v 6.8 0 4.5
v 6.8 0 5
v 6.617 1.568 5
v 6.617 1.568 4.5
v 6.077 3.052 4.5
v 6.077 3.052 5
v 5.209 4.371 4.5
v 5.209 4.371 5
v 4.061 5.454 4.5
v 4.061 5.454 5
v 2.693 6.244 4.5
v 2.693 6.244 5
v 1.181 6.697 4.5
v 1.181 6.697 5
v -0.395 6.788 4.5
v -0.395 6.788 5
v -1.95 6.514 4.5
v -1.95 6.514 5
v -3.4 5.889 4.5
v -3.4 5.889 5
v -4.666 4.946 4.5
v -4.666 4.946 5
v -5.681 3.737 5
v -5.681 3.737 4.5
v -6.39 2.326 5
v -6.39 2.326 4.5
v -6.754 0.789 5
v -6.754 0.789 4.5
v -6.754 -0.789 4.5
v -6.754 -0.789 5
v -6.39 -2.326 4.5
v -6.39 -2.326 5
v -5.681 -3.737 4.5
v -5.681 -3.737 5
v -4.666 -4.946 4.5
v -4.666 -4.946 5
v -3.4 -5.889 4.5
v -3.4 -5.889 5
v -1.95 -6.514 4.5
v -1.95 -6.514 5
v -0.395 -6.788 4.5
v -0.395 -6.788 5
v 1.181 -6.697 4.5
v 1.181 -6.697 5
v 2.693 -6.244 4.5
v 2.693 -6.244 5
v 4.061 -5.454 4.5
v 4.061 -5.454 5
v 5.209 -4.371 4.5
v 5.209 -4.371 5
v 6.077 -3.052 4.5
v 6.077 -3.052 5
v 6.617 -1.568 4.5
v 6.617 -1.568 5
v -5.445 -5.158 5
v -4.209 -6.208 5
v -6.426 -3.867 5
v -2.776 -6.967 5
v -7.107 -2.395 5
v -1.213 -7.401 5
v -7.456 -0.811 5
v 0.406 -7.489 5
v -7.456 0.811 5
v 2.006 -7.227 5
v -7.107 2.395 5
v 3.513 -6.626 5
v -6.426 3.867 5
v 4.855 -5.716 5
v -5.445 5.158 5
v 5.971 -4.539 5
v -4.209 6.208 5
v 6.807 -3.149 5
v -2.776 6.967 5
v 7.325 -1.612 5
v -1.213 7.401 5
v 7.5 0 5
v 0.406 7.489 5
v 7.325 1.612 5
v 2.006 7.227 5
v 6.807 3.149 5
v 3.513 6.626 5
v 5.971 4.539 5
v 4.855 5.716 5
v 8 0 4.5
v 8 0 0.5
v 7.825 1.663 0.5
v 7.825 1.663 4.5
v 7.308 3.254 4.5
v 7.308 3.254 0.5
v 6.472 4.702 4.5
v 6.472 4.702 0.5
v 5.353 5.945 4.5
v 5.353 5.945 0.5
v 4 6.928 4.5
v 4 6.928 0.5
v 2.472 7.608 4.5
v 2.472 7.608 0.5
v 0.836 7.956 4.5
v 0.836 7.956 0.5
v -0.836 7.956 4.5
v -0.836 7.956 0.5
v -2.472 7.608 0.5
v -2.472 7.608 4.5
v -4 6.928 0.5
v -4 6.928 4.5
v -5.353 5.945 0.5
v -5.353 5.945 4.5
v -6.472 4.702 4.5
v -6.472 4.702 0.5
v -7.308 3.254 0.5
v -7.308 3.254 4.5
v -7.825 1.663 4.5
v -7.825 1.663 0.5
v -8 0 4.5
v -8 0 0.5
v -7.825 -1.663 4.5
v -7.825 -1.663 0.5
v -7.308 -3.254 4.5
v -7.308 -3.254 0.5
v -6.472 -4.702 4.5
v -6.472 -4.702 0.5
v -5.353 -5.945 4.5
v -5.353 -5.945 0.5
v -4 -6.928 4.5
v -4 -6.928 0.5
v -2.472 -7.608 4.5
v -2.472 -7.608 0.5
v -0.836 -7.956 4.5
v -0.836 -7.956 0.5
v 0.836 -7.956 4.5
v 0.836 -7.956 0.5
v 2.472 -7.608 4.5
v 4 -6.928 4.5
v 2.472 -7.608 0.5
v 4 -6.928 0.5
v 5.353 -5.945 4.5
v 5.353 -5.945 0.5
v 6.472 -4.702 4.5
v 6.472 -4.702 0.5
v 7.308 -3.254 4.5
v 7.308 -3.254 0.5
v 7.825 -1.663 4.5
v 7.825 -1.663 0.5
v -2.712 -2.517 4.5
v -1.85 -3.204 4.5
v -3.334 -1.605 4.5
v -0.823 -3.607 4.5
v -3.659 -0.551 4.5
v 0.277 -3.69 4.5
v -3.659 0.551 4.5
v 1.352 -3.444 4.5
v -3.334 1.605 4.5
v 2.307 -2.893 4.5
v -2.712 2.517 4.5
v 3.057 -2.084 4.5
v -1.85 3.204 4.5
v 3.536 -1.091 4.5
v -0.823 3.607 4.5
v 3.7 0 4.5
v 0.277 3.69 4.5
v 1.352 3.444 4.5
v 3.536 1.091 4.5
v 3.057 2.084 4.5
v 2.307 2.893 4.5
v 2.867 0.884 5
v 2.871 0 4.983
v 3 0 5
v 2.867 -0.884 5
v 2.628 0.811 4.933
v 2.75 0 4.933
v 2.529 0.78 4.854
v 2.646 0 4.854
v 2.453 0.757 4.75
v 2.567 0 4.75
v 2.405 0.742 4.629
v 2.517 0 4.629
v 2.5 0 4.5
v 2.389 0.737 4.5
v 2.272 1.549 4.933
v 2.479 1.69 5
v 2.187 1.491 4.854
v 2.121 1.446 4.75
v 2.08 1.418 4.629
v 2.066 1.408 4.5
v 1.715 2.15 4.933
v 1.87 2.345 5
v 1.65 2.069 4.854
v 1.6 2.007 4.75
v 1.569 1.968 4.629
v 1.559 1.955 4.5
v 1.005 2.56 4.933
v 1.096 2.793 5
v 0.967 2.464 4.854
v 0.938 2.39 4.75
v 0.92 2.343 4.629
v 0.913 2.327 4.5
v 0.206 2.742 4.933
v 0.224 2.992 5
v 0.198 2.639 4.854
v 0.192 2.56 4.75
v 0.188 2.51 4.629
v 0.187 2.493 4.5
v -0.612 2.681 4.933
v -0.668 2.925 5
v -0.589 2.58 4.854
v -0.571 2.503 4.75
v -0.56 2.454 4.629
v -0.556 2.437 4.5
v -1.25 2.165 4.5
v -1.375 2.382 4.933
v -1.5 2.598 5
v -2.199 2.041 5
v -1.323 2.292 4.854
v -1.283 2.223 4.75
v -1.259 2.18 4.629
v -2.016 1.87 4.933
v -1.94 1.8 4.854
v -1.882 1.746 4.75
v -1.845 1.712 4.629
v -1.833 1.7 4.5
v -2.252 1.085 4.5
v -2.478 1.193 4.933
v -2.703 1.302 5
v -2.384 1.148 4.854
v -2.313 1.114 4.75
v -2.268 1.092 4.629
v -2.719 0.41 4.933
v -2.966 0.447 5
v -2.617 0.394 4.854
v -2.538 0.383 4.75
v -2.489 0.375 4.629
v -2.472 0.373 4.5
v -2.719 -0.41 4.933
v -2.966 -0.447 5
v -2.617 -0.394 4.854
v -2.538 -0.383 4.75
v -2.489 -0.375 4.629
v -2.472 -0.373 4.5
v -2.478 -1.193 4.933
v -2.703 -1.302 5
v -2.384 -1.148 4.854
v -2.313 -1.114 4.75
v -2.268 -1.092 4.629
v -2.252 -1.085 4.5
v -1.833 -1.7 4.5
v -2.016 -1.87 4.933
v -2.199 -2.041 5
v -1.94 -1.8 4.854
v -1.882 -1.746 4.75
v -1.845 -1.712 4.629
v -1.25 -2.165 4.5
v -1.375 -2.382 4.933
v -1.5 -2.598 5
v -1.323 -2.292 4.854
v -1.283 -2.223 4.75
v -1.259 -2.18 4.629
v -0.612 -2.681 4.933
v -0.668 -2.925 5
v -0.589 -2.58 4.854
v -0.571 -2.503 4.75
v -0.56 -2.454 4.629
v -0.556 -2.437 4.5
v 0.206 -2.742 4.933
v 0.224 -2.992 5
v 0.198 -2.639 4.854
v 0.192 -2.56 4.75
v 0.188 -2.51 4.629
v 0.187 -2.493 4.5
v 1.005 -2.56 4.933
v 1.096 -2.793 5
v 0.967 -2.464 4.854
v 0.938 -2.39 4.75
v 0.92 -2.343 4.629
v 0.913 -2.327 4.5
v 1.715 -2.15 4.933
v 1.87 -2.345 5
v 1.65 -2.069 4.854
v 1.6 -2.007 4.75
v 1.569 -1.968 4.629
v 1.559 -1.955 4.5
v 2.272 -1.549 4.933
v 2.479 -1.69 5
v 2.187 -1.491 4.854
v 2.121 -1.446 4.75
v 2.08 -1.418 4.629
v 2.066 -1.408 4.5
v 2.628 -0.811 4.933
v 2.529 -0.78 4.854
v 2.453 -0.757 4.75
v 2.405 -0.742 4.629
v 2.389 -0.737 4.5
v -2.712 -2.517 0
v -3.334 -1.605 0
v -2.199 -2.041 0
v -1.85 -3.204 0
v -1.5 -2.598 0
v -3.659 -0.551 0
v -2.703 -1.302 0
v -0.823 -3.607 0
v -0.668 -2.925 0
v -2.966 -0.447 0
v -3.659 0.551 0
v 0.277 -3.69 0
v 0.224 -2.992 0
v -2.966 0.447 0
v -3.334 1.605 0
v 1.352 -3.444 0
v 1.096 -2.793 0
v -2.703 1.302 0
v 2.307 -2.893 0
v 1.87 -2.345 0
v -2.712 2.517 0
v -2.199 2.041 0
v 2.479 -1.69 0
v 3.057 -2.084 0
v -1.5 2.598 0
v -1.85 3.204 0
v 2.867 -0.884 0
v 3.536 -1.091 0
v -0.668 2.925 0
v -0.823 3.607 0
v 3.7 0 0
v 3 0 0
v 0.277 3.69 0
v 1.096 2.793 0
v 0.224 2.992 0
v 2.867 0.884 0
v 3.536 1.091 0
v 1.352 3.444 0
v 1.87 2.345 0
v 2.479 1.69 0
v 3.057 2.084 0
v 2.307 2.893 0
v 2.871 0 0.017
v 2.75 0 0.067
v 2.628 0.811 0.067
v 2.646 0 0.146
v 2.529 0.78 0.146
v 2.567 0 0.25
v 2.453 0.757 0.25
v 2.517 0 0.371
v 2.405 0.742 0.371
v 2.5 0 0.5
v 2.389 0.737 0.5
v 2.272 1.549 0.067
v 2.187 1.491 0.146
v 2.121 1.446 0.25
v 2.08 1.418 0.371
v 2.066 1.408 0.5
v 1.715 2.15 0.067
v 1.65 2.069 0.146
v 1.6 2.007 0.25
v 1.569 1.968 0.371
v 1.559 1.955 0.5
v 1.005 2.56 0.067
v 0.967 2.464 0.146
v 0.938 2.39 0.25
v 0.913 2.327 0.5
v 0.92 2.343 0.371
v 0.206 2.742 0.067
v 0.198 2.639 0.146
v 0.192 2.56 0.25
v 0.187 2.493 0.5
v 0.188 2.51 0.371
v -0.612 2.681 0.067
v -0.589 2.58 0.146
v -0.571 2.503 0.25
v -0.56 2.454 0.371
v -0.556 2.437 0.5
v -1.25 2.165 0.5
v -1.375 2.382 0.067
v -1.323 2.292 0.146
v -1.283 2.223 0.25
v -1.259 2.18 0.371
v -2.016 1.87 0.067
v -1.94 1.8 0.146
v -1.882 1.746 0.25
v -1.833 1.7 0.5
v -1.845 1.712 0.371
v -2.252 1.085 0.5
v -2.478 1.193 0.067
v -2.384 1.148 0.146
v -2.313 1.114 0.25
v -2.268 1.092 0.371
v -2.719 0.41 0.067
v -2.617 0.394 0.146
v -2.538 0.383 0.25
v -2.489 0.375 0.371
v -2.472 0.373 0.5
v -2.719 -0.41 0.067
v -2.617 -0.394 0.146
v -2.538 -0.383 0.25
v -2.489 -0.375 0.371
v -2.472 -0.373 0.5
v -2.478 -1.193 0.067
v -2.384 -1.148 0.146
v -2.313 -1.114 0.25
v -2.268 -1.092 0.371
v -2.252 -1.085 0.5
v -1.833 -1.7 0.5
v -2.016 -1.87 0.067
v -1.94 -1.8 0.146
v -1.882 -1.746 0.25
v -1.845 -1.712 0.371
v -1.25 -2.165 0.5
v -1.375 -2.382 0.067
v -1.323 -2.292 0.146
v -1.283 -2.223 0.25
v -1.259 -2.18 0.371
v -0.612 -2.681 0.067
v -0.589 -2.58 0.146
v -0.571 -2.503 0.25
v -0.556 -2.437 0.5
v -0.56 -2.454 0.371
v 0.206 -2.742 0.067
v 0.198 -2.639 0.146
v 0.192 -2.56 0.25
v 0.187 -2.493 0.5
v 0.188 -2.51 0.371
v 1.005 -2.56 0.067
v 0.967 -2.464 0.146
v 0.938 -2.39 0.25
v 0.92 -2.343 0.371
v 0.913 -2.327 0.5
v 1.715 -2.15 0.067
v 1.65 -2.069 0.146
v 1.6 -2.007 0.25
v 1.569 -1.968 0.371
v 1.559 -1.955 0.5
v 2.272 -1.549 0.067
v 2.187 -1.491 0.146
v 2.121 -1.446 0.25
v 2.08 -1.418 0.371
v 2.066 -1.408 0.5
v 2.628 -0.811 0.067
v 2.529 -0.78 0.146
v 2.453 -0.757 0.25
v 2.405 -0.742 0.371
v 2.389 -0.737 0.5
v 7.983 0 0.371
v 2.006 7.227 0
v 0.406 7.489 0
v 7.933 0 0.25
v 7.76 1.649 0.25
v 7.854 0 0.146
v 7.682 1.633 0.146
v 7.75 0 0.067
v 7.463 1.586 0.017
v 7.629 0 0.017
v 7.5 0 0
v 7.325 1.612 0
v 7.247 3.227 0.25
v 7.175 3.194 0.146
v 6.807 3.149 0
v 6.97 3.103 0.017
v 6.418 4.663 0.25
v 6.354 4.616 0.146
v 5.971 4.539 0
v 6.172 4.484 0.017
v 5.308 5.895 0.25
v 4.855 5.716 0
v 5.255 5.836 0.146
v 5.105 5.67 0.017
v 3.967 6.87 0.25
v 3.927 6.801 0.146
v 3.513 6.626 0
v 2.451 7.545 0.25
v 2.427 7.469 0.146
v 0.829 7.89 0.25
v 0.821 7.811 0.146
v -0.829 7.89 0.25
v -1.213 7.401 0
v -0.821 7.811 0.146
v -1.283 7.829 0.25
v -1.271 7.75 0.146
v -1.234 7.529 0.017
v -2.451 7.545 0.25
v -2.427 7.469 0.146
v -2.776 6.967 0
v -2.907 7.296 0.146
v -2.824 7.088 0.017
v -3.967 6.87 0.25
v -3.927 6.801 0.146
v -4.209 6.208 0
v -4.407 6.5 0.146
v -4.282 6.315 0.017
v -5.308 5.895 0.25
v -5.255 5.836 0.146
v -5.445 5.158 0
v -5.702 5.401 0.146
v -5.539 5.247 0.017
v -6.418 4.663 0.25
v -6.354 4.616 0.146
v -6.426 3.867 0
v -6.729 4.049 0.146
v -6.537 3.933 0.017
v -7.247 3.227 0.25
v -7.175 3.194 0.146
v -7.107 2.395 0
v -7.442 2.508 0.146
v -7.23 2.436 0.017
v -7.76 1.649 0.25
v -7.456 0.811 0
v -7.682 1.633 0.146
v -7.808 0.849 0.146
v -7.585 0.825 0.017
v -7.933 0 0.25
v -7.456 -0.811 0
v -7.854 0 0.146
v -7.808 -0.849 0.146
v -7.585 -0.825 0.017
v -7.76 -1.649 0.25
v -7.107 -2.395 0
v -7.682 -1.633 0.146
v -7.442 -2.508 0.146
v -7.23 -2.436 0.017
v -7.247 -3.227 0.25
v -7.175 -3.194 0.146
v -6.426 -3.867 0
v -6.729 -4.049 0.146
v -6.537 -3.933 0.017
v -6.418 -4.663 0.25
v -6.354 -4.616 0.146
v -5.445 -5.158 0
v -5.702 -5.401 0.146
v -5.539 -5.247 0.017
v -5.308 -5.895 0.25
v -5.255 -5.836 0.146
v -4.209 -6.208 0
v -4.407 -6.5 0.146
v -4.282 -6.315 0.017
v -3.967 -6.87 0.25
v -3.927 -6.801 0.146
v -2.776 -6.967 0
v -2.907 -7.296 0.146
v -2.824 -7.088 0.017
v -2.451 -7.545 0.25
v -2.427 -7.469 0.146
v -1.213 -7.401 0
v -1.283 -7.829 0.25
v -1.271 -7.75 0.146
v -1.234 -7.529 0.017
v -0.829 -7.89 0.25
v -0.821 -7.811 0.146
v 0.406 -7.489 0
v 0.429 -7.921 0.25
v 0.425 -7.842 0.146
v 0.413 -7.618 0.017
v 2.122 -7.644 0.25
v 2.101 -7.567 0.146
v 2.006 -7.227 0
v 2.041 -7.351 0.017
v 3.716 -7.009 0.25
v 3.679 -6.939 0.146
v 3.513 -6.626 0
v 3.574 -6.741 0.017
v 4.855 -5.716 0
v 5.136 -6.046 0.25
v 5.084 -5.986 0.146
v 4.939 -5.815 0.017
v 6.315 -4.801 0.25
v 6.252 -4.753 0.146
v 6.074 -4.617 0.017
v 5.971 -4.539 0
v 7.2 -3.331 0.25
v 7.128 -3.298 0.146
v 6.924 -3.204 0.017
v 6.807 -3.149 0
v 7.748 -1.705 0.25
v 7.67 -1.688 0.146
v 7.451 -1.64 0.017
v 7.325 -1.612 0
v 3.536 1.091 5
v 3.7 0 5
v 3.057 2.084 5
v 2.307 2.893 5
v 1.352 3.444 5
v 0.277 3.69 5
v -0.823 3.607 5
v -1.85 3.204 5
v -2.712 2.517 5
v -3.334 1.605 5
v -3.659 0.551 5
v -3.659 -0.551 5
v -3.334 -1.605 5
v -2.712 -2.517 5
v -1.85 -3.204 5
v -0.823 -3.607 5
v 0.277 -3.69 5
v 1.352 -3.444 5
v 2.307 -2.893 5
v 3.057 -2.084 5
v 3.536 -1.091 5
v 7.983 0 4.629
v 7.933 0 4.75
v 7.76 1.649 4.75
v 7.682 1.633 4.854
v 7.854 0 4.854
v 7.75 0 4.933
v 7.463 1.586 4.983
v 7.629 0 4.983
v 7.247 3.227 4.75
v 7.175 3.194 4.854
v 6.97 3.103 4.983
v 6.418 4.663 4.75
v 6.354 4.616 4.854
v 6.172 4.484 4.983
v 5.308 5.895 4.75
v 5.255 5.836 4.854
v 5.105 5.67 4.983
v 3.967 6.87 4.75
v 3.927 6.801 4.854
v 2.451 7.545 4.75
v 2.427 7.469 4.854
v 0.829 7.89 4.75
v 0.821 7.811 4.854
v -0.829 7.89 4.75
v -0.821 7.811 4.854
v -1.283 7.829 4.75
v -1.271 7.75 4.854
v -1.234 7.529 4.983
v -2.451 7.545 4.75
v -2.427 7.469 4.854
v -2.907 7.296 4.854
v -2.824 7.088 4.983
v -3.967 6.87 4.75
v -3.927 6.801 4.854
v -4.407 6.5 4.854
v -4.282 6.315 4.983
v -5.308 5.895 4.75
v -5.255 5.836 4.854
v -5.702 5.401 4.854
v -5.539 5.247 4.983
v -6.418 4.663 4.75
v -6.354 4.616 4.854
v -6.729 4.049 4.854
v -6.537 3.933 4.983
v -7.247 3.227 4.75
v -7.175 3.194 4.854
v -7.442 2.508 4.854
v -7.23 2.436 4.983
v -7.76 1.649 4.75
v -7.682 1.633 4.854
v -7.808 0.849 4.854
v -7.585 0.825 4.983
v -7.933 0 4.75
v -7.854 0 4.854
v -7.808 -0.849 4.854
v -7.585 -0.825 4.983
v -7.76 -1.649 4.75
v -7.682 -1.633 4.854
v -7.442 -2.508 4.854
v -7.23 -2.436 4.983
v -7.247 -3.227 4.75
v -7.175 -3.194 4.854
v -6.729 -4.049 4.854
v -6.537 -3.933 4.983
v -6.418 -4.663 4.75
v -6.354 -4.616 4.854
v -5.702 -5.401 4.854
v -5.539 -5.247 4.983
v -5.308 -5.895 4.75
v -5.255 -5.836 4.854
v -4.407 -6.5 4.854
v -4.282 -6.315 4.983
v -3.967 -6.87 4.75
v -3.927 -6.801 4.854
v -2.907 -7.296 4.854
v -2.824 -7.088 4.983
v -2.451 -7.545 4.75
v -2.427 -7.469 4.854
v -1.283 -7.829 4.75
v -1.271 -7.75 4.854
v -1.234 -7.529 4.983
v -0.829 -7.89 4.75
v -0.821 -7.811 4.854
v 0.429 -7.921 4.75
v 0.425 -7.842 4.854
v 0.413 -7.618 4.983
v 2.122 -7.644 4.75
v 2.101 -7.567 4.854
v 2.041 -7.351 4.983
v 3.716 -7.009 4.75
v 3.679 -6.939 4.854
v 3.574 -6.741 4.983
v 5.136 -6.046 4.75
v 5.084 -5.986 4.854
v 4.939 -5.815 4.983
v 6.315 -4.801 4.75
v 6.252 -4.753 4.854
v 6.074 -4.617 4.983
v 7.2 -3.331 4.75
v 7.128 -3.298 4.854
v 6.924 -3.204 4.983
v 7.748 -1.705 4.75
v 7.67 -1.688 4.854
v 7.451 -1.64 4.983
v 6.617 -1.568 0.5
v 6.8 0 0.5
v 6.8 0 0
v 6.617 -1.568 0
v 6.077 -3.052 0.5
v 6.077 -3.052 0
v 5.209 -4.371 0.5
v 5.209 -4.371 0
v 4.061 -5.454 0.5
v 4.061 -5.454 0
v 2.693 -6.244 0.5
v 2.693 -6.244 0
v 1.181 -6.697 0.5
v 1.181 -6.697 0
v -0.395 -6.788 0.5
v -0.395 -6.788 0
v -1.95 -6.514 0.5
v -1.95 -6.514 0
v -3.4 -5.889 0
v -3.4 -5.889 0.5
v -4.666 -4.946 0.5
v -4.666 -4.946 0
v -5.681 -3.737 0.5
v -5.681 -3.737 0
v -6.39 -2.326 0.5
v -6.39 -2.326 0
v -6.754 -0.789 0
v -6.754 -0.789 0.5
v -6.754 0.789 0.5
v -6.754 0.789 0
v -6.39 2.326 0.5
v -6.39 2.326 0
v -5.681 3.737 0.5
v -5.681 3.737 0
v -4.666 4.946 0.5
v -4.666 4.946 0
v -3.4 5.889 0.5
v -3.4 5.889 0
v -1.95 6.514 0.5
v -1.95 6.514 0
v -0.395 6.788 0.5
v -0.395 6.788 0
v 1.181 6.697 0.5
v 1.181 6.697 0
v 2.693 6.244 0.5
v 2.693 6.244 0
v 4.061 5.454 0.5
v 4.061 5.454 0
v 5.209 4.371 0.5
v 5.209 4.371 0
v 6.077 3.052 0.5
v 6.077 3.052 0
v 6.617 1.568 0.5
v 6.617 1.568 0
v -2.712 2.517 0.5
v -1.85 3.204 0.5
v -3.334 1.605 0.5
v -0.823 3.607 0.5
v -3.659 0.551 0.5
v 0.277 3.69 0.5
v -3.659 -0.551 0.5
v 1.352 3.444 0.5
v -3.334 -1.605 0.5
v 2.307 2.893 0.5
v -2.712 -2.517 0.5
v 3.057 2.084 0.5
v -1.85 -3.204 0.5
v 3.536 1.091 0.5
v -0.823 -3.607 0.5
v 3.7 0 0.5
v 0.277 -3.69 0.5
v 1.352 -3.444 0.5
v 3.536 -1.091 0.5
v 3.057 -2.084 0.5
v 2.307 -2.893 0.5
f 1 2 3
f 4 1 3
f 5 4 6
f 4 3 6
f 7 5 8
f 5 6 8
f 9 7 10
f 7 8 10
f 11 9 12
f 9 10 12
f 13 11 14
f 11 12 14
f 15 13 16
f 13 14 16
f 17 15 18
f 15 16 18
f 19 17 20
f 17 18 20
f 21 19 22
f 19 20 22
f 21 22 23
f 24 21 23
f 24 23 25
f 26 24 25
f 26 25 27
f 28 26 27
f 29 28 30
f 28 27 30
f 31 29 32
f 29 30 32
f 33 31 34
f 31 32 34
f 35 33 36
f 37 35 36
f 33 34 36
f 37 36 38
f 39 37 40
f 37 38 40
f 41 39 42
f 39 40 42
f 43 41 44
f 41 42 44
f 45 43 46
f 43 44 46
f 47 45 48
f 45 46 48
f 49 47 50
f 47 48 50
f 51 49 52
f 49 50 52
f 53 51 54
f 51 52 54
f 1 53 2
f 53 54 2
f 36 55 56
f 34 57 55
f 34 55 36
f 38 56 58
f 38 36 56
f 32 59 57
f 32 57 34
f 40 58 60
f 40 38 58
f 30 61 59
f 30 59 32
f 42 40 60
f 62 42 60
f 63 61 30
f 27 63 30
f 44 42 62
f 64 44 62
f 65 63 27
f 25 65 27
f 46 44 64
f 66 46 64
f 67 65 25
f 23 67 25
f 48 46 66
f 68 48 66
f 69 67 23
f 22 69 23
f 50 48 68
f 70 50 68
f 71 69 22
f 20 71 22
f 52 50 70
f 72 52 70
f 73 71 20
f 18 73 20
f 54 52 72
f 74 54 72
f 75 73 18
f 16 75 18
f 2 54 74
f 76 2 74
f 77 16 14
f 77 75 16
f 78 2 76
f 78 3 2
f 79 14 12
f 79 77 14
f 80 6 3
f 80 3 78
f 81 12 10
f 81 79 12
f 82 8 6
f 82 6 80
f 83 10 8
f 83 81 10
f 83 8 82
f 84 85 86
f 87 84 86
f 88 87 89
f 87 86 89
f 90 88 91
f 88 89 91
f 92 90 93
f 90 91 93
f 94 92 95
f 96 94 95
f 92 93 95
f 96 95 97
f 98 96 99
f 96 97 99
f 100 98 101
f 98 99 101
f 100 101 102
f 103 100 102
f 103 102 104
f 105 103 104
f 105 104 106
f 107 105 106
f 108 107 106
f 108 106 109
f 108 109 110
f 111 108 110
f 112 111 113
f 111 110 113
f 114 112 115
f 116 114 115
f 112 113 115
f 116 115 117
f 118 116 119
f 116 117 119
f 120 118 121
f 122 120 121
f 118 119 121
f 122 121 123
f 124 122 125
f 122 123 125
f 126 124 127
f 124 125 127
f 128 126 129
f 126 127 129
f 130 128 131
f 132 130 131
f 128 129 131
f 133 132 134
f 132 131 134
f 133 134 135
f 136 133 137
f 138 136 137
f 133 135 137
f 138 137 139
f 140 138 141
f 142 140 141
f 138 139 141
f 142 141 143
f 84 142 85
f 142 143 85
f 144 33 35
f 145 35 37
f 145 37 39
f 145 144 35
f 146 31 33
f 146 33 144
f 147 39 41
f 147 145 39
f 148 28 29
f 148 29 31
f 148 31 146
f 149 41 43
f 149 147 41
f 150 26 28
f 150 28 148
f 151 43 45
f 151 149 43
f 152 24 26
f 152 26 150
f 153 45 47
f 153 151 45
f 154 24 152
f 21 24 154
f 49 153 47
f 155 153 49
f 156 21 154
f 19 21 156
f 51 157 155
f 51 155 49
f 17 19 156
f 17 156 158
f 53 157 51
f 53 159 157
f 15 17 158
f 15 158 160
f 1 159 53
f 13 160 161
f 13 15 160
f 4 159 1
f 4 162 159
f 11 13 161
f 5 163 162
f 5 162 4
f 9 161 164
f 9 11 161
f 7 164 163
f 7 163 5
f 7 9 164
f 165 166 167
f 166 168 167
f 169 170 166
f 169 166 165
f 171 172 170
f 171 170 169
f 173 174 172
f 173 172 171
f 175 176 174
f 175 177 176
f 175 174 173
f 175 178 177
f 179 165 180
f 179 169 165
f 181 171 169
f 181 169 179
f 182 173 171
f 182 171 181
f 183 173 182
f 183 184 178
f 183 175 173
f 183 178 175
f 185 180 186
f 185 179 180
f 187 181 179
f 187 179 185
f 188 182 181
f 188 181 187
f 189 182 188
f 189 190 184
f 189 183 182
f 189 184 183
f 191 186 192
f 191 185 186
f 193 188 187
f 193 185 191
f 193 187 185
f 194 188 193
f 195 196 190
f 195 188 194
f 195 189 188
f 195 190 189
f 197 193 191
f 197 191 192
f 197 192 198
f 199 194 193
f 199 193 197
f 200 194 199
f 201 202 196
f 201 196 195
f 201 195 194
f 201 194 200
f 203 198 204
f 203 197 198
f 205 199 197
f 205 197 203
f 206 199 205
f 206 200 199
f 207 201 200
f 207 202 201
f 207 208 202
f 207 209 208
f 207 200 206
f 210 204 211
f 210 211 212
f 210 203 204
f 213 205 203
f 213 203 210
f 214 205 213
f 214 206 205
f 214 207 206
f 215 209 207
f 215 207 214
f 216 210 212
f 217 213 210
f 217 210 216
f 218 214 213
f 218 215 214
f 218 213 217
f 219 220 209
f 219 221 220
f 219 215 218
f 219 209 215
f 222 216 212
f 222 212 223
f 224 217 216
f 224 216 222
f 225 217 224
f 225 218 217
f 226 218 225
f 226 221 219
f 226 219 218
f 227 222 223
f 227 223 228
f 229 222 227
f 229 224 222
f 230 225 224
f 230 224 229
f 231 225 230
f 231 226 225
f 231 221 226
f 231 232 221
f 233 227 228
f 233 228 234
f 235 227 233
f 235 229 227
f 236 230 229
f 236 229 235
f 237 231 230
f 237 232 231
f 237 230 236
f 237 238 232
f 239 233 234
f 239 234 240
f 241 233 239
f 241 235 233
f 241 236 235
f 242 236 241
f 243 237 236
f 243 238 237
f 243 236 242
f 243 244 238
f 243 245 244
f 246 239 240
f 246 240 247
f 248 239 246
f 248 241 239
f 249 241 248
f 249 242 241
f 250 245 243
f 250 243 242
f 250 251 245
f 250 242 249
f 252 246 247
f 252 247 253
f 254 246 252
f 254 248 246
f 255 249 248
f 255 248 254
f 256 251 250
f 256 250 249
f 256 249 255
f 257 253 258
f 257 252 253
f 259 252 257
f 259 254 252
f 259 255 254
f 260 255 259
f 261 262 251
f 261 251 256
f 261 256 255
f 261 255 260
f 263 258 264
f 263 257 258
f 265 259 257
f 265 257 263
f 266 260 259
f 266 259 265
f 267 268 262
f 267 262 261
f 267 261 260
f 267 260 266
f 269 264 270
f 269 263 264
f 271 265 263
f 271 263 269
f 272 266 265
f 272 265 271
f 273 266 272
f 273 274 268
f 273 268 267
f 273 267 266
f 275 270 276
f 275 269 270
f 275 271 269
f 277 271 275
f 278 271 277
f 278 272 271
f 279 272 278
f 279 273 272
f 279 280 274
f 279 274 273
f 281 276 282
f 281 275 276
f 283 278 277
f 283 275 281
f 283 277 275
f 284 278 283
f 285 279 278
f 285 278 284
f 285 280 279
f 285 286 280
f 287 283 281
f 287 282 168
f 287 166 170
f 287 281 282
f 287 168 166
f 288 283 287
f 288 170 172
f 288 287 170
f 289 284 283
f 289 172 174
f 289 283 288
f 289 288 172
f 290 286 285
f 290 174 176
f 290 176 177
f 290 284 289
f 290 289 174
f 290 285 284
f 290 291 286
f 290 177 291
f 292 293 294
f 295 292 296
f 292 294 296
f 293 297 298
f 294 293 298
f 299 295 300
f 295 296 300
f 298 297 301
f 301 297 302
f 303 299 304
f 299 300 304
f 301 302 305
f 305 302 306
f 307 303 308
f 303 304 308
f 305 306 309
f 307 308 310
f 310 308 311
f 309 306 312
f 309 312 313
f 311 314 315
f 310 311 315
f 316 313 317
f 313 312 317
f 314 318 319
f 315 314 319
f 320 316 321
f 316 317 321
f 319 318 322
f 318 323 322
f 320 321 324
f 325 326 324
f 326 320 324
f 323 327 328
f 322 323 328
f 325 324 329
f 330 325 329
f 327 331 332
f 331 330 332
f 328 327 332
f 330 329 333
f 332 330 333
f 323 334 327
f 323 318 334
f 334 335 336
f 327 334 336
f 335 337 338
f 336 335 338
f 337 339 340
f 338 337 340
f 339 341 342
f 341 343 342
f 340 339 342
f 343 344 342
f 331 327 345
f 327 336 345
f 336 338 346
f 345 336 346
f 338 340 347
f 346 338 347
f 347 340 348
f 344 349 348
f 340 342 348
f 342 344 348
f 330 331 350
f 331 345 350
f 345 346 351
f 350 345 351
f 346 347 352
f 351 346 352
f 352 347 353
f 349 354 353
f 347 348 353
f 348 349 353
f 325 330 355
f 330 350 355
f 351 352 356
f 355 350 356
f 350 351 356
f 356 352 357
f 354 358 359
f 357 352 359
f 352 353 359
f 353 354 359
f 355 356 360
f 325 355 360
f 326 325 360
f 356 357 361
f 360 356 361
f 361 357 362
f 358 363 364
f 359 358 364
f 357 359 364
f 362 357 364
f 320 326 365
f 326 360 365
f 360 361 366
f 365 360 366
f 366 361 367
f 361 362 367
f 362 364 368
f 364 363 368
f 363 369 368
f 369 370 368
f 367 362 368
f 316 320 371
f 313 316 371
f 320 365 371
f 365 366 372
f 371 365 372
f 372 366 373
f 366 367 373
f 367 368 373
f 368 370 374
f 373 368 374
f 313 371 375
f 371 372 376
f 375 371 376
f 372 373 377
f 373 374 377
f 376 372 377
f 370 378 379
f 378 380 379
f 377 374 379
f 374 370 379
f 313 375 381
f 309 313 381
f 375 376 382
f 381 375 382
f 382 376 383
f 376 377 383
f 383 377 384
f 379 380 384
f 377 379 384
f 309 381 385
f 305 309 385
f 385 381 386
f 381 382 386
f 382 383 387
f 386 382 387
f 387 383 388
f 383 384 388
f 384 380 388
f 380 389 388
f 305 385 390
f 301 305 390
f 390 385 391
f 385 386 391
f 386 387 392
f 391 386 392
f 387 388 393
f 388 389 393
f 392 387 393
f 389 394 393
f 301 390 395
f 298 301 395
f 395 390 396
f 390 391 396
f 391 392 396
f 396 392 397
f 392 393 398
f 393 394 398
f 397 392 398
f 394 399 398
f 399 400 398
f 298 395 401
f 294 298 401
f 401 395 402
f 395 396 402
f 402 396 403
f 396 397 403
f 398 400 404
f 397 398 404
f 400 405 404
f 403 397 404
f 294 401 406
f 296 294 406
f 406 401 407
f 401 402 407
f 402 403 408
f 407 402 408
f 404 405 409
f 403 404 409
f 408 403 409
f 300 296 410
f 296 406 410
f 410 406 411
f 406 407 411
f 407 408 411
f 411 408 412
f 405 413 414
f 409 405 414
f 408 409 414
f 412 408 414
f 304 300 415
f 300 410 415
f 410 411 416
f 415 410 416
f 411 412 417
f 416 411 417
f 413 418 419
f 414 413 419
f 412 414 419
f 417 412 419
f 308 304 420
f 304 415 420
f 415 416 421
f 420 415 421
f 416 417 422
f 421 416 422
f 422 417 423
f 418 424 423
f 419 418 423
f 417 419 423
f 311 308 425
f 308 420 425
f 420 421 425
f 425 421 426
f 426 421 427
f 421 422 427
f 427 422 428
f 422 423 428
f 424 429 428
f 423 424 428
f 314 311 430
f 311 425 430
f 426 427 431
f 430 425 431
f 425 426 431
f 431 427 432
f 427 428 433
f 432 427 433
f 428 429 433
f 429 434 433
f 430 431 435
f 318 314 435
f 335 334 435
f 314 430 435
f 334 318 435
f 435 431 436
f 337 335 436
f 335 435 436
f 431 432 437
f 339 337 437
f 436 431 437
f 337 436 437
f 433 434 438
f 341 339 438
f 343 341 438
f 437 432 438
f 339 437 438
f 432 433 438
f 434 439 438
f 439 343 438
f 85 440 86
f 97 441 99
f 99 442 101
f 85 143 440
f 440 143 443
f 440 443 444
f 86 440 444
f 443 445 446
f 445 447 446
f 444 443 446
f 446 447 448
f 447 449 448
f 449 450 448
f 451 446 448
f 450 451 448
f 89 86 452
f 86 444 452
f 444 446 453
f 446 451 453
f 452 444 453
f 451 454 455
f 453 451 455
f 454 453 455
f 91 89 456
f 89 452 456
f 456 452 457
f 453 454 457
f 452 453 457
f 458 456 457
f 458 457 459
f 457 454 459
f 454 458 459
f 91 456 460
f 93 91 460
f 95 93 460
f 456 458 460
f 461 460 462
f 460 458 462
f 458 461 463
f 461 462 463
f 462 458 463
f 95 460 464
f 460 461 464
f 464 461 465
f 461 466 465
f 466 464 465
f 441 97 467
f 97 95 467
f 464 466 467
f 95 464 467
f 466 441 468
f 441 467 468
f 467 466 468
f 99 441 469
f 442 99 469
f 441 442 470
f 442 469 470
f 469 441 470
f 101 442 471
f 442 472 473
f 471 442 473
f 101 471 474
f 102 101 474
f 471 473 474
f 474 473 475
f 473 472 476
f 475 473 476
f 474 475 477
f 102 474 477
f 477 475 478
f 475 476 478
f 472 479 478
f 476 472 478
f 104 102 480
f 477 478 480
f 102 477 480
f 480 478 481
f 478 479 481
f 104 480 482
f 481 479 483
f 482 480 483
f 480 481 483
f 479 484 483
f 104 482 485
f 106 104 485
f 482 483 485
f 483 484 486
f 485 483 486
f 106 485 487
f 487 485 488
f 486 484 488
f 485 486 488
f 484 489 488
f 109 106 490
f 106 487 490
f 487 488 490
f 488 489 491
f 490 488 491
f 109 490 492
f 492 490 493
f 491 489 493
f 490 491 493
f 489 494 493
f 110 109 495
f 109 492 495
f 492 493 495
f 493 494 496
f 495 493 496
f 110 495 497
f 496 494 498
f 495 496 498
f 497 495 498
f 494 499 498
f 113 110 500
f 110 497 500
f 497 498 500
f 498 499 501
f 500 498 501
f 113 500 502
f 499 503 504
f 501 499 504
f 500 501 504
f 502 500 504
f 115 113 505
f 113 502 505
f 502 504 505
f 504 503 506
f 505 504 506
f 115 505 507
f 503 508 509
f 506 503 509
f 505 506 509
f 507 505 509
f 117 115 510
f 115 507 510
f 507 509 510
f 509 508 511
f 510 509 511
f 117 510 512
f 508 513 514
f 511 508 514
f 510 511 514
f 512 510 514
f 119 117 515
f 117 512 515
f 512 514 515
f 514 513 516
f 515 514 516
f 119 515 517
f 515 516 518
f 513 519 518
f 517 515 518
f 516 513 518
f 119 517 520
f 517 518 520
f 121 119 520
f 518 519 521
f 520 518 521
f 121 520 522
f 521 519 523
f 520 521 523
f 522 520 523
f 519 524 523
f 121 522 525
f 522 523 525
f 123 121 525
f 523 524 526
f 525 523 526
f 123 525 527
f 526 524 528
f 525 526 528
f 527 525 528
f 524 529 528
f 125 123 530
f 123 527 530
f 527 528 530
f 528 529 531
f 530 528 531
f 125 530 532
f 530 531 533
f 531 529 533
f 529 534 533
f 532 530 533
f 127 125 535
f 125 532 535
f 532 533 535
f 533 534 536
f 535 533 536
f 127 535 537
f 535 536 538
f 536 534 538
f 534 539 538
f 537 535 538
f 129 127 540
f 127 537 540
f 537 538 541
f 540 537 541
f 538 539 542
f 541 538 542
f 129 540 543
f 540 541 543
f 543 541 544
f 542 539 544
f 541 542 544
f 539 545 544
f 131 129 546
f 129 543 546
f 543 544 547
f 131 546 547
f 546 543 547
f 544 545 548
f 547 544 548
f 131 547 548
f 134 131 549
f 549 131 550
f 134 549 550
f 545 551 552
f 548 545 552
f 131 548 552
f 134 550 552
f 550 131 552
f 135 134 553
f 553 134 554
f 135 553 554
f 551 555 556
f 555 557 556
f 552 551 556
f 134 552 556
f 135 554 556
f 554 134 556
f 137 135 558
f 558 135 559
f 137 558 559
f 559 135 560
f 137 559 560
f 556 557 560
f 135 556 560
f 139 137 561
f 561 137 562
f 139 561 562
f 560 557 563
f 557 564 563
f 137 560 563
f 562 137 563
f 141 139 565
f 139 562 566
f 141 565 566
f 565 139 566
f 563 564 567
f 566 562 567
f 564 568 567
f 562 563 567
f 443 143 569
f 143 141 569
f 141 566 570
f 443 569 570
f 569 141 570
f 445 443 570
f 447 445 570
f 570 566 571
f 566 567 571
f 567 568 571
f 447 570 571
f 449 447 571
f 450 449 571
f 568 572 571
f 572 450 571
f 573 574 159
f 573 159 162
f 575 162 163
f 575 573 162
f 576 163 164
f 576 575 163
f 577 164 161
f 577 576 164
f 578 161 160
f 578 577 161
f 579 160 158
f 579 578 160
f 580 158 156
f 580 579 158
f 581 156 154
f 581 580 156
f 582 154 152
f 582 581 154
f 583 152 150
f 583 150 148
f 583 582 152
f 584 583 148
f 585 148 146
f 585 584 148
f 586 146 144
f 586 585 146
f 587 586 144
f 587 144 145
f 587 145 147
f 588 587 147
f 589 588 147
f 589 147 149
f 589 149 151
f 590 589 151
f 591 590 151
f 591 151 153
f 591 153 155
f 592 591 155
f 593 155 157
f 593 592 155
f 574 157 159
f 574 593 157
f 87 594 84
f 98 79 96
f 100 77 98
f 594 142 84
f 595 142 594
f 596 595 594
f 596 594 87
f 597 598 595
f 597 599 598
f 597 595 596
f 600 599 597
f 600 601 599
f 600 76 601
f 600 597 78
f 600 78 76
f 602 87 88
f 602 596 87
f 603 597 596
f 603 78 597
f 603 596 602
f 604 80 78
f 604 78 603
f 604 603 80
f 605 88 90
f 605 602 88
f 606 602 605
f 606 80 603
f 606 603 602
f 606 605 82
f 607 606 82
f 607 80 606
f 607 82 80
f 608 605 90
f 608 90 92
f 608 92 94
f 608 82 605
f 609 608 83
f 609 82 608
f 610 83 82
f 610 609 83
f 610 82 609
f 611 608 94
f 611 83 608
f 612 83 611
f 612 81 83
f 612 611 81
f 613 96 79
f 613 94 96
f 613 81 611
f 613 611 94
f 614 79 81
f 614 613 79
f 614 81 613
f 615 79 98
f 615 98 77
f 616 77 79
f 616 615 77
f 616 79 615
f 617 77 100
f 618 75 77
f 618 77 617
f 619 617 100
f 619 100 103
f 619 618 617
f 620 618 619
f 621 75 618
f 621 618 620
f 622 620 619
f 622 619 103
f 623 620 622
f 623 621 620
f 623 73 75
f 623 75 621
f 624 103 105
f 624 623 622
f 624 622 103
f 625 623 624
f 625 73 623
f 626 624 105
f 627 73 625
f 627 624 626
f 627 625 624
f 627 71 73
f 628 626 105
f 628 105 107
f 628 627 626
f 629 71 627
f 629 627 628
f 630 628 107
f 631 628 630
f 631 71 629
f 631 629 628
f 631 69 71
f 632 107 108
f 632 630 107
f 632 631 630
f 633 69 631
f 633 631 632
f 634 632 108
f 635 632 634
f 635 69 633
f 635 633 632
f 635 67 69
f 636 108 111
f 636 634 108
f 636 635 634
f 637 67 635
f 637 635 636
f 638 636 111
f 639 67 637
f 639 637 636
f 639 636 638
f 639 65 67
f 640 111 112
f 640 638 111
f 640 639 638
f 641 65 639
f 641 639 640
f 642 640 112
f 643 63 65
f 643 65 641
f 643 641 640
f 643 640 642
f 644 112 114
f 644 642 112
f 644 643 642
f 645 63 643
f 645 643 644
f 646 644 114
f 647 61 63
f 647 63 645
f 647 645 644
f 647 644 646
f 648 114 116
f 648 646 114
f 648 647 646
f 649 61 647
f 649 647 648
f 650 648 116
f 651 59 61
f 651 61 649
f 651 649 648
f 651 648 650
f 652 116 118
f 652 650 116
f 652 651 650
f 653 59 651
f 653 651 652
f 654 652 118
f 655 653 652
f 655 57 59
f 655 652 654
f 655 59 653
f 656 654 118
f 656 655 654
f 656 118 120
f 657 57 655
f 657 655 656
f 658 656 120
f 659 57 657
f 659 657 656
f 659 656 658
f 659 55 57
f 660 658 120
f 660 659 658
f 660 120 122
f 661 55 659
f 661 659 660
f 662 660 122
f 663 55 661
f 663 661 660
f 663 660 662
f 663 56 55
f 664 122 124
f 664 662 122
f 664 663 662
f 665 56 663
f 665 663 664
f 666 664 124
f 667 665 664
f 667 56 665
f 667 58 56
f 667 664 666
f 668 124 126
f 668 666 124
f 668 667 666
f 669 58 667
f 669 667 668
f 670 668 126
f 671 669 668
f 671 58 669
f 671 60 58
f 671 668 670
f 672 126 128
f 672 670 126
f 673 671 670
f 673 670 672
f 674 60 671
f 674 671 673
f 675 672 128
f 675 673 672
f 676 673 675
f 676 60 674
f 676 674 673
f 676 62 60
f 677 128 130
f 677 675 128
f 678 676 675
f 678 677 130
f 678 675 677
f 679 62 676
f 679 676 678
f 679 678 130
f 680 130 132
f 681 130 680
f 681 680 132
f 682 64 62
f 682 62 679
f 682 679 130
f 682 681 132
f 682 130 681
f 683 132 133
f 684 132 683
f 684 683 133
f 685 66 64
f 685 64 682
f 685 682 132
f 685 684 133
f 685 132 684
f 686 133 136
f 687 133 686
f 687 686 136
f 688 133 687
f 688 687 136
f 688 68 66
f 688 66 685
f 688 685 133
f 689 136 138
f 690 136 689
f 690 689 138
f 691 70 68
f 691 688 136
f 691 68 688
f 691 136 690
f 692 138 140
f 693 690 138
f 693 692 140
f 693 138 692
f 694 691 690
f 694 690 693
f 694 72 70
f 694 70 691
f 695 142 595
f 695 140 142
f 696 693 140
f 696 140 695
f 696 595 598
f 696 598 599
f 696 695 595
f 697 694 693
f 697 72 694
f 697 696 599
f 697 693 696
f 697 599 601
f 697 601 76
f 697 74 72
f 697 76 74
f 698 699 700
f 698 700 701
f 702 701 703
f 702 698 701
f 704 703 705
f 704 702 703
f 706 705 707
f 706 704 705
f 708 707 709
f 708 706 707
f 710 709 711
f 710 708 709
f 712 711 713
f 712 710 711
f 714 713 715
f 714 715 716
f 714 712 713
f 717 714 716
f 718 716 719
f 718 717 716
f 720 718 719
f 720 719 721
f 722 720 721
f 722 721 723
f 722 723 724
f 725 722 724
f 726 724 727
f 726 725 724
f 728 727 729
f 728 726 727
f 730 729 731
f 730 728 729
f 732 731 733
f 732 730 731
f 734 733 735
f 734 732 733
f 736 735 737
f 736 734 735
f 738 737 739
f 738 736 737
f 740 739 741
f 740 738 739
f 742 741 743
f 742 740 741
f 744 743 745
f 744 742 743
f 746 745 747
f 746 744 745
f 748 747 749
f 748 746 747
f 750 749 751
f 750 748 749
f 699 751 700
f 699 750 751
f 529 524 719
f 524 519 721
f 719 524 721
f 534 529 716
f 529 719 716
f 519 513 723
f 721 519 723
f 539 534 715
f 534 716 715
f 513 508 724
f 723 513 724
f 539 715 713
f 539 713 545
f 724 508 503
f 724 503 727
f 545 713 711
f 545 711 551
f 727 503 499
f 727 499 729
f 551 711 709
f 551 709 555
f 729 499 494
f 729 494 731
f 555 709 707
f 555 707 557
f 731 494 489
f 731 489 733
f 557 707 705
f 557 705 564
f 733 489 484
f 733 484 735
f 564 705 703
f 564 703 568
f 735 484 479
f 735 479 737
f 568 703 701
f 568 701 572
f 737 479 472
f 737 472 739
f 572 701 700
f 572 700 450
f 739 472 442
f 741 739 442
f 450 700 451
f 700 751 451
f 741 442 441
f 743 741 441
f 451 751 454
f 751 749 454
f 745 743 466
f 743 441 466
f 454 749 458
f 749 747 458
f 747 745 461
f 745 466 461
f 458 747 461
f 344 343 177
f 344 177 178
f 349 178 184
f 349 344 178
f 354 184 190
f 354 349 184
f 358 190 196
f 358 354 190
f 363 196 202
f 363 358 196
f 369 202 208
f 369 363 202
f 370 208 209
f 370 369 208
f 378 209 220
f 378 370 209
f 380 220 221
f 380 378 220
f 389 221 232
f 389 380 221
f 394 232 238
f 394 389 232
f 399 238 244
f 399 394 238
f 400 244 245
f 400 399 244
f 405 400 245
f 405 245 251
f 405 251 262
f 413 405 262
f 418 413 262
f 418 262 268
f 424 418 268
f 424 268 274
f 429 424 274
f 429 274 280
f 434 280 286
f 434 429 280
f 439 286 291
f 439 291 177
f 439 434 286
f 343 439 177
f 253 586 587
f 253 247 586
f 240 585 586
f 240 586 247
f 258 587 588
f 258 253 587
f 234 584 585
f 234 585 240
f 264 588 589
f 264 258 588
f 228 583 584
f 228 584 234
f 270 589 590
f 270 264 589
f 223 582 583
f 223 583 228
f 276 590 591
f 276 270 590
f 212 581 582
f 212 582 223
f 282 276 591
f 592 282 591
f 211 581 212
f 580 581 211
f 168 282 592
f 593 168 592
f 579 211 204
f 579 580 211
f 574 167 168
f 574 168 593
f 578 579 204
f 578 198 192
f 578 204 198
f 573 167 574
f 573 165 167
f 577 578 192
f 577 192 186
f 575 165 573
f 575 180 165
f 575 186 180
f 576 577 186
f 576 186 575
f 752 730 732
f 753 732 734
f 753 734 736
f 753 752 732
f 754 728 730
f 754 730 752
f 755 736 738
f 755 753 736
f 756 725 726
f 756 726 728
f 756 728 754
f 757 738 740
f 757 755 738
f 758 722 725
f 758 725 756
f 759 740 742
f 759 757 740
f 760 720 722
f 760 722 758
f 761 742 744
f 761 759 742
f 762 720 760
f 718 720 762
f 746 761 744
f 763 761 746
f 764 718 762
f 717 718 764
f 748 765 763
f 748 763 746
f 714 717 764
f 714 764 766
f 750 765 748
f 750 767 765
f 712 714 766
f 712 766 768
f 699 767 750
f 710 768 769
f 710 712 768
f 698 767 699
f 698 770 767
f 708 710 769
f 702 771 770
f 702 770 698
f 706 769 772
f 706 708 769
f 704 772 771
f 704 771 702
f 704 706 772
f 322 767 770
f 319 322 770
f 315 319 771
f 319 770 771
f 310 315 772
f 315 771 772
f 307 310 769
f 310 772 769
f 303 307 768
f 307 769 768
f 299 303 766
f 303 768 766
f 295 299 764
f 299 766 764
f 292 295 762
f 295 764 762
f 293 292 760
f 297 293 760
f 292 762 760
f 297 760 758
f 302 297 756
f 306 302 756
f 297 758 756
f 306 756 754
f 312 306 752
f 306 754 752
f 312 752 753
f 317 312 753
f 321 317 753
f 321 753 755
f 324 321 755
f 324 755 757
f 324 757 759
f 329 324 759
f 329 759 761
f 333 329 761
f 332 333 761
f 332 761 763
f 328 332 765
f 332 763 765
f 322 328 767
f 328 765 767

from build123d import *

# Parameters (mm, degrees)
ESBO_O1_R                = 8
ESBO_O1_R_2              = 2.5
RESSALTO_EXTRUS_O1_DEPTH = 5
ESBO_O2_R                = 6.8
ESBO_O2_R_2              = 3.7
CORTE_EXTRUS_O1_DEPTH    = 0.5
CORTE_EXTRUS_O2_START    = -0.5
ESBO_O3_R                = 6.8
ESBO_O3_R_2              = 3.7
CORTE_EXTRUS_O2_DEPTH    = 0.5
FILETE1_R                = 0.5


with BuildPart() as part:
    # Esboço1 → Ressalto-extrusão1 (new body)
    with BuildSketch(Plane.XY):
        Circle(ESBO_O1_R)
        Circle(ESBO_O1_R_2, mode=Mode.SUBTRACT)
    extrude(amount=RESSALTO_EXTRUS_O1_DEPTH)

    # Esboço2 → Corte-extrusão1 (cut)
    with BuildSketch(Plane.XY.offset(5)):
        Circle(ESBO_O2_R)
        Circle(ESBO_O2_R_2, mode=Mode.SUBTRACT)
    extrude(amount=-CORTE_EXTRUS_O1_DEPTH, mode=Mode.SUBTRACT)

    # Esboço3 → Corte-extrusão2 (cut)
    with BuildSketch(Plane(origin=(0, 0, 0), x_dir=(-1, 0, 0), z_dir=(0, 0, -1)).offset(CORTE_EXTRUS_O2_START)):
        with Locations(Location((0, 0, 0), (0, 0, 180))):
            Circle(ESBO_O3_R)
        with Locations(Location((0, 0, 0), (0, 0, 180))):
            Circle(ESBO_O3_R_2, mode=Mode.SUBTRACT)
    extrude(amount=CORTE_EXTRUS_O2_DEPTH, mode=Mode.SUBTRACT)

    # Filete1
    filete1_edges = [part.edges().sort_by_distance(p)[0] for p in [
        (-8, 0, 0),
        (-8, 0, 5),
        (-2.5, 0, 0),
        (-2.5, 0, 5),
    ]]
    fillet(filete1_edges, radius=FILETE1_R)


solid = part.part
